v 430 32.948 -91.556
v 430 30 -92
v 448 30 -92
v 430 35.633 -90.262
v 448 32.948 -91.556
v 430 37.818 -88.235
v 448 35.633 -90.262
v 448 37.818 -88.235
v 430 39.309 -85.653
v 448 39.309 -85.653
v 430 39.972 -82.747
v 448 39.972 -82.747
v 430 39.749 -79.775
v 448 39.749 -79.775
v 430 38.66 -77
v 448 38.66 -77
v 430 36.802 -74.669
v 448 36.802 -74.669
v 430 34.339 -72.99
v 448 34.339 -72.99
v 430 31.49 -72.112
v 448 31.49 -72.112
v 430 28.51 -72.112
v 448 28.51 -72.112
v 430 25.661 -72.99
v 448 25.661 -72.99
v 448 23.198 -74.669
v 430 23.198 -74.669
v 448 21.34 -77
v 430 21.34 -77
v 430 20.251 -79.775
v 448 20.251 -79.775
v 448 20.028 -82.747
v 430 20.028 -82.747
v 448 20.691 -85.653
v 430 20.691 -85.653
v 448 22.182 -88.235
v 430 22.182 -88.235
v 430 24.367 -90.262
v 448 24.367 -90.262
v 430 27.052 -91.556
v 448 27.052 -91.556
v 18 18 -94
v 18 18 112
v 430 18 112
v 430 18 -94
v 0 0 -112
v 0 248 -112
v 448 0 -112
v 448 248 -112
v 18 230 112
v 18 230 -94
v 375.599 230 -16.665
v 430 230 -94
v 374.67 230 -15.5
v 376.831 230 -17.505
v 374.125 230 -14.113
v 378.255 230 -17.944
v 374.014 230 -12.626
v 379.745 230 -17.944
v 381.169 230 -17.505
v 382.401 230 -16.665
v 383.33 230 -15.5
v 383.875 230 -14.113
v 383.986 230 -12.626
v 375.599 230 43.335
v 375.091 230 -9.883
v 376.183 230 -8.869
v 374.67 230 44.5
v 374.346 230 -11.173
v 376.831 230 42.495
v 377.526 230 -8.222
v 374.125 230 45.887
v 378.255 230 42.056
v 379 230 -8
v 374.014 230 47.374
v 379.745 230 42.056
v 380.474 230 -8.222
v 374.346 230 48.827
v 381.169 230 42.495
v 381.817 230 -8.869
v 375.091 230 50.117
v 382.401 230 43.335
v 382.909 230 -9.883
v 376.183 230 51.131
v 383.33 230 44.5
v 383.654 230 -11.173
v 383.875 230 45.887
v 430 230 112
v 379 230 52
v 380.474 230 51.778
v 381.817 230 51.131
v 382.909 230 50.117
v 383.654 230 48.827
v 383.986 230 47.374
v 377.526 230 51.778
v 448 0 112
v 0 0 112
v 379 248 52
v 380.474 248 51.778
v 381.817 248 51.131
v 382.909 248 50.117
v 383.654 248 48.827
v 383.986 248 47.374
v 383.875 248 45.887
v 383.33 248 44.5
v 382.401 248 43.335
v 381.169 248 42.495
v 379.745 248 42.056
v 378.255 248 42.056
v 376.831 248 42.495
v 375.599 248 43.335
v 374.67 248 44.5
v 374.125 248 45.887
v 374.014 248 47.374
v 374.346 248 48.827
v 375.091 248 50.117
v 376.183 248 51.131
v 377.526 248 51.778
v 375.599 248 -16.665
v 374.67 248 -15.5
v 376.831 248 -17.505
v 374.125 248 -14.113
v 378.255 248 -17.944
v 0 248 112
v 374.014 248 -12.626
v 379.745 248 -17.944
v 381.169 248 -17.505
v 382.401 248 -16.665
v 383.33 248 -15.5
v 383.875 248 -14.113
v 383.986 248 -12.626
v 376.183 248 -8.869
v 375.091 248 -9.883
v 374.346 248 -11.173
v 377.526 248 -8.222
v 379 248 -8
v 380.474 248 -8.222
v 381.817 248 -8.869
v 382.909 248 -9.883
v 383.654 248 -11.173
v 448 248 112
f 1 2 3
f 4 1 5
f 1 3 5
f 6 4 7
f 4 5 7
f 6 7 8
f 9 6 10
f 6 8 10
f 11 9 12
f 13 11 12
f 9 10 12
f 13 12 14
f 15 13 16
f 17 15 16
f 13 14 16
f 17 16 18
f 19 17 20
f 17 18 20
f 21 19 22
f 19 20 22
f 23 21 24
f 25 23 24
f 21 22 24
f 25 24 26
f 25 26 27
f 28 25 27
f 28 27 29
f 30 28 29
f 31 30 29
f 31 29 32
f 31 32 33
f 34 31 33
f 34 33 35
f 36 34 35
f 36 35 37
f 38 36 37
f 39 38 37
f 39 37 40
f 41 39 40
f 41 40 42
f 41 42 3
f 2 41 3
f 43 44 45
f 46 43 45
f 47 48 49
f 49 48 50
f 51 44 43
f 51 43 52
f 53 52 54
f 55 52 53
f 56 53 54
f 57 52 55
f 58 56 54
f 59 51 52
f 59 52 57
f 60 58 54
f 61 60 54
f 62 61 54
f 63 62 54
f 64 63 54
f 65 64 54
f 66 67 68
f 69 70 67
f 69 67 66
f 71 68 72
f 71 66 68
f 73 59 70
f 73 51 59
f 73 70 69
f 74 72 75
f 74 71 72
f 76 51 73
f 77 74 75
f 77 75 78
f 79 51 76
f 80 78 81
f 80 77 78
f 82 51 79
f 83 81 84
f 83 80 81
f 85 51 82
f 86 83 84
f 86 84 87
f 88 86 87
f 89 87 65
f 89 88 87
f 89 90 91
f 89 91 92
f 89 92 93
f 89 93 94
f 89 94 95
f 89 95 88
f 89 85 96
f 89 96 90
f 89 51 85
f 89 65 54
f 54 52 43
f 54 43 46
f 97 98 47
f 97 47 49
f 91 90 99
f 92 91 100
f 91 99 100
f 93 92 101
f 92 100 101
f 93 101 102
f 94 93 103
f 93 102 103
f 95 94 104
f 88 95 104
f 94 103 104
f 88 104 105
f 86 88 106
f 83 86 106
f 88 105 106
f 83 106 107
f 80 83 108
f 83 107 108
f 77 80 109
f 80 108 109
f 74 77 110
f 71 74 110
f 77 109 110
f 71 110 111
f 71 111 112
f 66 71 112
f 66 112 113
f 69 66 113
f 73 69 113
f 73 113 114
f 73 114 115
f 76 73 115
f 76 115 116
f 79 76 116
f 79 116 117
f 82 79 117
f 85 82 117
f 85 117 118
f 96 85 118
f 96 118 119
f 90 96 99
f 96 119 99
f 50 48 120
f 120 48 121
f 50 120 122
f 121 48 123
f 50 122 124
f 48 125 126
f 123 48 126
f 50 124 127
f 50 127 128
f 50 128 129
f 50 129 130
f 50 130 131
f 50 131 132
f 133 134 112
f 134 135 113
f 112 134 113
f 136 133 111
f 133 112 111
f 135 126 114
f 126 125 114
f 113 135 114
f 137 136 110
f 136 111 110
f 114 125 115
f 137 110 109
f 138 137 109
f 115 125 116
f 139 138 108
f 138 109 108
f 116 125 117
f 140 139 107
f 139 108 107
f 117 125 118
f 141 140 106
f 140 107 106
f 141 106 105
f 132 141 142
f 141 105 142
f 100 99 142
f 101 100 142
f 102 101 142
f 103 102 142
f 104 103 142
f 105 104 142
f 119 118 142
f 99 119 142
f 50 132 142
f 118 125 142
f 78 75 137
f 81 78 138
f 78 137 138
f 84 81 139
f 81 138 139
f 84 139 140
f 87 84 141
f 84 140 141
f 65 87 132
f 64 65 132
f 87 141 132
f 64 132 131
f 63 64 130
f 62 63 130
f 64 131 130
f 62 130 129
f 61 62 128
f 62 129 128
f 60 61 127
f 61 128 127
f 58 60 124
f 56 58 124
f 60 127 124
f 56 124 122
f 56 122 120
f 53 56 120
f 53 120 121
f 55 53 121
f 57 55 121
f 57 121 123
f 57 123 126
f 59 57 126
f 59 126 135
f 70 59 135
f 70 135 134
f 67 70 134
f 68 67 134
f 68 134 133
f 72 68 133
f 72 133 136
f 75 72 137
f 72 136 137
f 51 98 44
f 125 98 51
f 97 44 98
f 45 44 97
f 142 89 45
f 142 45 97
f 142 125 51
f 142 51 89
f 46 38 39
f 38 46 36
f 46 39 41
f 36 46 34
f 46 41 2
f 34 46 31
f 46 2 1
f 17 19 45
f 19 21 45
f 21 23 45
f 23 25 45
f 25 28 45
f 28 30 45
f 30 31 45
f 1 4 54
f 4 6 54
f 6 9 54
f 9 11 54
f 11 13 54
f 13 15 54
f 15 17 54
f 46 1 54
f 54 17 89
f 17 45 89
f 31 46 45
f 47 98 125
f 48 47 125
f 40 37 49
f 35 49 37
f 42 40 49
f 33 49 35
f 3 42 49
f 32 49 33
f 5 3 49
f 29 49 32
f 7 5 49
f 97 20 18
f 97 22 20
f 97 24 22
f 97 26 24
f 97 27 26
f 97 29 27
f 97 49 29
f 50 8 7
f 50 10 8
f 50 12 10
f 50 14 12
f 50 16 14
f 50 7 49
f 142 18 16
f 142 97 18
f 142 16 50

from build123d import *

# Parameters (mm, degrees)
SKETCH1_W                    = 448
SKETCH1_H                    = 248
TAO_KHOI_DEPTH               = 112
SKETCH2_W                    = 412
SKETCH2_H                    = 212
TAO_VUNG_DAT_VO_TRONG_DEPTH  = 206
TAO_LO_DI_DAY_RA_NGOAI_REACH = 526.168
SKETCH3_R                    = 10
SKETCH5_R                    = 5
TAO_LO_LAY_KHI_DEPTH         = 18


with BuildPart() as part:
    # Sketch1 → tao_khoi (new, symmetric)
    with BuildSketch(Plane.XY):
        with Locations((224, 124)):
            Rectangle(SKETCH1_W, SKETCH1_H)
    extrude(amount=TAO_KHOI_DEPTH, both=True)

    # Sketch2 → tao_vung_dat_vo_trong (cut)
    with BuildSketch(Plane.XY.offset(112)):
        with Locations((224, 124)):
            Rectangle(SKETCH2_W, SKETCH2_H)
    extrude(amount=-TAO_VUNG_DAT_VO_TRONG_DEPTH, mode=Mode.SUBTRACT)

    # Sketch3 → tao_lo_di_day_ra_ngoai (cut, up to next)
    with BuildSketch(Plane(origin=(448, 0, 0), x_dir=(0, 0, -1), z_dir=(1, 0, 0)), mode=Mode.PRIVATE) as tao_lo_di_day_ra_ngoai_sk1:
        with Locations((82, 30)):
            Circle(SKETCH3_R)
    tao_lo_di_day_ra_ngoai_tool1 = extrude(tao_lo_di_day_ra_ngoai_sk1.sketch, amount=-TAO_LO_DI_DAY_RA_NGOAI_REACH, mode=Mode.PRIVATE) & part.part
    add(tao_lo_di_day_ra_ngoai_tool1.solids().sort_by_distance((448, 30, -82))[0], mode=Mode.SUBTRACT)

    # Sketch5 → tao_lo_lay_khi (cut)
    with BuildSketch(Plane(origin=(0, 248, 0), x_dir=(1, 0, 0), z_dir=(0, 1, 0))):
        with Locations(Location((379, 13, 0), (0, 0, 270))):
            Circle(SKETCH5_R)
        with Locations(Location((379, -47, 0), (0, 0, 270))):
            Circle(SKETCH5_R)
    extrude(amount=-TAO_LO_LAY_KHI_DEPTH, mode=Mode.SUBTRACT)


solid = part.part
